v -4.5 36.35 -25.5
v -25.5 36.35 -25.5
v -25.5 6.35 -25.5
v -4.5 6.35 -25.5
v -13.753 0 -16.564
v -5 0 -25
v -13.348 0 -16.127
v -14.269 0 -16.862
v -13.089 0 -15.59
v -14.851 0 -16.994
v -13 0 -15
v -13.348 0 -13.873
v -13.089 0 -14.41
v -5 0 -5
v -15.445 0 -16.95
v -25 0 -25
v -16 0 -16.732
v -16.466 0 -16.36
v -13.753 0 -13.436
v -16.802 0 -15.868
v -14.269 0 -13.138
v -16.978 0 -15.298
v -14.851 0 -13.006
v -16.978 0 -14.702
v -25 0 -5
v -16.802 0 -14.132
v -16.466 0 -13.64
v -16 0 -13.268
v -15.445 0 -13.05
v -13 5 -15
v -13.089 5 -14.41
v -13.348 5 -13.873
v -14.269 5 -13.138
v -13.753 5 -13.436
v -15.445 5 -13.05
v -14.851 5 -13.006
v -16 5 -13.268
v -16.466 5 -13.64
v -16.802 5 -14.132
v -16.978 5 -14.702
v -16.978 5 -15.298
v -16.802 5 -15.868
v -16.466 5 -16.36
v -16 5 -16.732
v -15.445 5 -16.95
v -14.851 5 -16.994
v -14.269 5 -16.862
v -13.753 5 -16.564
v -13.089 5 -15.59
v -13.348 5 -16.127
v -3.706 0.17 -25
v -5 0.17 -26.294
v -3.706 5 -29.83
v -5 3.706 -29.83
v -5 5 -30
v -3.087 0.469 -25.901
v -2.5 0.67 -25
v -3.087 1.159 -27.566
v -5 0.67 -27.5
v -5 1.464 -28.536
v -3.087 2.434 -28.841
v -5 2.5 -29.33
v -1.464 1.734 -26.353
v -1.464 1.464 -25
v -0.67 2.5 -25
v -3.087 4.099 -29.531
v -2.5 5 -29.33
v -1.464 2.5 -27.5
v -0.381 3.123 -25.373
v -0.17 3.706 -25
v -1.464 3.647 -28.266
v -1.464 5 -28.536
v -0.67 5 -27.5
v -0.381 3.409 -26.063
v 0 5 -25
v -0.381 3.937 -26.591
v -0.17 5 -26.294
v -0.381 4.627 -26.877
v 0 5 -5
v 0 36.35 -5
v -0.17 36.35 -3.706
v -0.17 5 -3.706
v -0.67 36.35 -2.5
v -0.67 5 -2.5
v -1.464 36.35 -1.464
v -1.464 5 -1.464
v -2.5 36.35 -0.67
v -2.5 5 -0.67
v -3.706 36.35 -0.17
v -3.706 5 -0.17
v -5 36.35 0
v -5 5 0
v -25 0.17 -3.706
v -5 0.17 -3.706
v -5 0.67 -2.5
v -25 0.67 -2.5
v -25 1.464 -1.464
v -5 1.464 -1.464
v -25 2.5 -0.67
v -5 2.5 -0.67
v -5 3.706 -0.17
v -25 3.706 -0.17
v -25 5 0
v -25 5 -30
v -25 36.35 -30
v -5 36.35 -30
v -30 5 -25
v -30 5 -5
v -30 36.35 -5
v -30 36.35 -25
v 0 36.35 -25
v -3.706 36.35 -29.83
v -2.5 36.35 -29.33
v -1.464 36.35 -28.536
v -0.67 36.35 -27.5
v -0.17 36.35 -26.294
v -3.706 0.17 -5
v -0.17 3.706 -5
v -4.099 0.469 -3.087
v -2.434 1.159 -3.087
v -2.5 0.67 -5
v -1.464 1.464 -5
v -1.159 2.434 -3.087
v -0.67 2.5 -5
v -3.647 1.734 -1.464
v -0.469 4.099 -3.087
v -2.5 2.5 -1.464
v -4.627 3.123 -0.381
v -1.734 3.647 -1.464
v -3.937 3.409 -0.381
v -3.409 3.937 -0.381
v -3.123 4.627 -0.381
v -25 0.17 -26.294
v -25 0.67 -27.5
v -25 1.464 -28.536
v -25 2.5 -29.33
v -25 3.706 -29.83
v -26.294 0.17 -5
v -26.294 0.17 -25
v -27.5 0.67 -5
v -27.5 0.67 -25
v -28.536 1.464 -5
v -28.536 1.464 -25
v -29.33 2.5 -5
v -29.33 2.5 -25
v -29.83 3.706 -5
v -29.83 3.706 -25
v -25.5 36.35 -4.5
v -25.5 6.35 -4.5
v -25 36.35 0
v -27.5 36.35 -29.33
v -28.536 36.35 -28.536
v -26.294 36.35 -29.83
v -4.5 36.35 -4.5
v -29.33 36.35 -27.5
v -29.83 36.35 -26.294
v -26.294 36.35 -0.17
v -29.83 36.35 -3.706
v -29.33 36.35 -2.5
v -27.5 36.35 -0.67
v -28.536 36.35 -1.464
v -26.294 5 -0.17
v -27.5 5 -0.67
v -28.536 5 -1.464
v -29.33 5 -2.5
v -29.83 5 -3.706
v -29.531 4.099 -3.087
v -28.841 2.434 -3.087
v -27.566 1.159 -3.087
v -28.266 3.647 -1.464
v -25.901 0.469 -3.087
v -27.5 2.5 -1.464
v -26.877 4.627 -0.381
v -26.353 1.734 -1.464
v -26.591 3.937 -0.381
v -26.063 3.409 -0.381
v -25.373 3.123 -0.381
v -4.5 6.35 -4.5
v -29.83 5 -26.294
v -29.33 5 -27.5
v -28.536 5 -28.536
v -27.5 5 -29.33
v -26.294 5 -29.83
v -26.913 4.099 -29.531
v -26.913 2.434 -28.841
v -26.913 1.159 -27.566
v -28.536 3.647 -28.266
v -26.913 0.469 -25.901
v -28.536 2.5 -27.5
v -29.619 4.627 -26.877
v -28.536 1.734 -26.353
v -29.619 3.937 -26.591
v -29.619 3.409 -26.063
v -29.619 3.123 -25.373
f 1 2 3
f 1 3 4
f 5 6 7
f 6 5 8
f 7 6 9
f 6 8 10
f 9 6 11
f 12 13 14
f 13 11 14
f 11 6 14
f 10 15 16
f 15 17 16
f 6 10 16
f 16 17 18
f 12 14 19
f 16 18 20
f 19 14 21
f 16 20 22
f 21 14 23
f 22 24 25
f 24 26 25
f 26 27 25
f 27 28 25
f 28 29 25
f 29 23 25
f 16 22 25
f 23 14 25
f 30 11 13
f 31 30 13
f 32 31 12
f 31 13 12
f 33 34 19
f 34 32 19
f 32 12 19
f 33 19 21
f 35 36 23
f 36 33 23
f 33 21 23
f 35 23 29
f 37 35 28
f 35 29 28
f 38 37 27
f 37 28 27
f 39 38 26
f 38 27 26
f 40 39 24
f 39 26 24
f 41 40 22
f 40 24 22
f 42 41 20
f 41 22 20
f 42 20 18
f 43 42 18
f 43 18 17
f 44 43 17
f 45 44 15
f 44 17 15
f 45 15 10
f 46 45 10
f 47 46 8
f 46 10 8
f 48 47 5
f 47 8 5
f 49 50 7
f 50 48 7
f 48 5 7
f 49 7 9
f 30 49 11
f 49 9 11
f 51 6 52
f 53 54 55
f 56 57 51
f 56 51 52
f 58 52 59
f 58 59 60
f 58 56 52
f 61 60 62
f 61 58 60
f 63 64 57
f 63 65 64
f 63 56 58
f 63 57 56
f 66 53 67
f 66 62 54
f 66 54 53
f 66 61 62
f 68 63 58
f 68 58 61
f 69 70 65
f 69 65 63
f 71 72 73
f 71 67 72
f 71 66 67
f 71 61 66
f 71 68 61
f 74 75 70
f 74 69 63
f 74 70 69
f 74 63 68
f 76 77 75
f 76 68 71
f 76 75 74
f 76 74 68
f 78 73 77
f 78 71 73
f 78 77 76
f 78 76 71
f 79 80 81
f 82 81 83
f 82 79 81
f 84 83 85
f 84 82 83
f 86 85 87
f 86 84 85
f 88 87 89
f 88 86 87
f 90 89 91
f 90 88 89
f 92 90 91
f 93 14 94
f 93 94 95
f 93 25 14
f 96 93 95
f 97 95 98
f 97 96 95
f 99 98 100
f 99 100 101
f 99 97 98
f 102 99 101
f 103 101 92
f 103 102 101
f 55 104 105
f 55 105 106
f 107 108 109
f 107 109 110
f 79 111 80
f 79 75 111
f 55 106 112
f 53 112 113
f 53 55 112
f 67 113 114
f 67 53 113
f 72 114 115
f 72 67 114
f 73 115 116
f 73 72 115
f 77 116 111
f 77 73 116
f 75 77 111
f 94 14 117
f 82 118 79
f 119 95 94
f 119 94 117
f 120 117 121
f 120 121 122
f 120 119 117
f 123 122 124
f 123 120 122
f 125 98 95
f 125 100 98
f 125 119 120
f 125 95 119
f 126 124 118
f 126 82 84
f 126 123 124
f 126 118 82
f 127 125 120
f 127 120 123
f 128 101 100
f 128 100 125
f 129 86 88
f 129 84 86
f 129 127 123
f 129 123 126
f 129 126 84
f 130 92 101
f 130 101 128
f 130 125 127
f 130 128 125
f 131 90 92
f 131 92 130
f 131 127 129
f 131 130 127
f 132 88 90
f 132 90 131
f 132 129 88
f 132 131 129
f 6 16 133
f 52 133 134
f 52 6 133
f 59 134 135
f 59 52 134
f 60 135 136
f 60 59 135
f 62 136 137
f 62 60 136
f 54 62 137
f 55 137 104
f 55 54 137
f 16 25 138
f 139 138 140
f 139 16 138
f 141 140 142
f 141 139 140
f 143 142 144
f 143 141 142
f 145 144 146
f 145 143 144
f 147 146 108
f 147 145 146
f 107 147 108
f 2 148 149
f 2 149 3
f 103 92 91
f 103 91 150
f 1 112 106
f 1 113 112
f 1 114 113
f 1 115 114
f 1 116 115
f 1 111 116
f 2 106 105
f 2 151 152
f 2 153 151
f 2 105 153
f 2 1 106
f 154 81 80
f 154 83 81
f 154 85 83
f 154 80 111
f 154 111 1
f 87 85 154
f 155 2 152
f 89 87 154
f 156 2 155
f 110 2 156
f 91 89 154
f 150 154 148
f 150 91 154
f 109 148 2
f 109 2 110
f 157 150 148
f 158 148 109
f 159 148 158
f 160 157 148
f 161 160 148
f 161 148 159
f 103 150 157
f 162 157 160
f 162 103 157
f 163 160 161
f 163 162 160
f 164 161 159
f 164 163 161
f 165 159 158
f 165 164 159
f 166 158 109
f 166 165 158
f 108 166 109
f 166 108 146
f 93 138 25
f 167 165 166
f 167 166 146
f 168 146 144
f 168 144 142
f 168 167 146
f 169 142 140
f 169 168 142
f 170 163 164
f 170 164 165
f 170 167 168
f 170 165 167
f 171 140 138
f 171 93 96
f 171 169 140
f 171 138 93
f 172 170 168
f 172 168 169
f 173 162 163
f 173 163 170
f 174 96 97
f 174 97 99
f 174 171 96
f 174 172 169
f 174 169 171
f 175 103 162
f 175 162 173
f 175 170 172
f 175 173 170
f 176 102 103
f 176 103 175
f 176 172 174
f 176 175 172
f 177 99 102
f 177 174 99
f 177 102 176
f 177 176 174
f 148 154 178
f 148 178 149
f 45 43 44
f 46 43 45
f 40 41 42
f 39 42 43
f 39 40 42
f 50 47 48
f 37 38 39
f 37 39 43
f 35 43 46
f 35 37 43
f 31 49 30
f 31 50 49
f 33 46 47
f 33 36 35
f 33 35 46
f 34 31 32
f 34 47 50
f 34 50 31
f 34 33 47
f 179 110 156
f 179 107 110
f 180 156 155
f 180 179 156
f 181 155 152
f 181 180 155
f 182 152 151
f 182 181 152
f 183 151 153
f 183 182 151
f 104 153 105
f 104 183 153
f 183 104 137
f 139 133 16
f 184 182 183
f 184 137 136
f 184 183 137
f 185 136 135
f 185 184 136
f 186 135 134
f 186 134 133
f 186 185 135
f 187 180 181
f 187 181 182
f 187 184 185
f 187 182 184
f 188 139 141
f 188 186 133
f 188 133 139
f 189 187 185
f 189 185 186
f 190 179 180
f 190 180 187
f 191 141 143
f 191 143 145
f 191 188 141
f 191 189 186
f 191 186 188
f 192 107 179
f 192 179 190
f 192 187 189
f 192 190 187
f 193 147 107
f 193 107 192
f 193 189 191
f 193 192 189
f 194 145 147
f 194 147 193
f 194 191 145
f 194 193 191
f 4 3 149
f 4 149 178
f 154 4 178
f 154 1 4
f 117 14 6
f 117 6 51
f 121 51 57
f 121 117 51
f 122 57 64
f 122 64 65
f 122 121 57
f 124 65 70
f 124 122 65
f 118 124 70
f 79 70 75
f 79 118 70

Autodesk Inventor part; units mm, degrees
ref_plane "YZ Plane" through (0, 0, 0) normal (1, 0, 0) x (0, 1, 0)
ref_plane "XZ Plane" through (0, 0, 0) normal (0, 1, 0) x (-1, 0, 0)
ref_plane "XY Plane" through (0, 0, 0) normal (0, 0, 1) x (1, 0, 0)
sketch "Sketch1" plane through (0, 0, 0) normal (0, 1, 0) x (-1, 0, 0)
  line L0 (0, 0) -> (30, 0)
  line L1 (30, 0) -> (30, -30)
  line L2 (30, -30) -> (0, -30)
  line L3 (0, -30) -> (0, 0)
  dimension "d0" = 30
  dimension "d1" = 30
extrude "Extrusion1" add sketch "Sketch1" along normal blind 36.35
sketch "Sketch2" plane through (0, 36.35, 0) normal (0, 1, 0) x (1, 0, 0)
  line L0 (0, 0) -> (0, 30) projected
  line L1 (0, 0) -> (0, 4.5)
  line L2 (0, 4.5) -> (-4.5, 4.5)
  line L3 (-4.5, 4.5) -> (-25.5, 4.5)
  line L4 (-25.5, 4.5) -> (-25.5, 25.5)
  line L5 (-25.5, 25.5) -> (-4.5, 25.5)
  line L6 (-4.5, 25.5) -> (-4.5, 4.5)
  dimension "d4" = 4.5
  dimension "d5" = 4.5
  dimension "d6" = 21
  dimension "d7" = 21
extrude "Extrusion2" cut sketch "Sketch2" against normal blind 30
sketch "Sketch3" plane through (0, 0, 0) normal (0, -1, 0) x (1, 0, 0)
  line L0 (0, 0) -> (-15, 0)
  line L1 (0, 0) -> (-30, 0) projected
  line L2 (-15, 0) -> (-15, -15)
  circle A0 centre (-15, -15) radius 2
  dimension "d10" = 15
  dimension "d11" = 4
extrude "Extrusion3" cut sketch "Sketch3" against normal blind 5
fillet "Fillet1" radius 5 4 edges at (0, 0, -15) (-15, 0, 0) (-15, 0, -30) (-30, 0, -15)
fillet "Fillet2" radius 5 8 edges at (-1.4645, 1.4645, -28.5355) (0, 20.675, -30) (-1.4645, 1.4645, -1.4645) (0, 20.675, 0) (-28.5355, 1.4645, -28.5355) (-30, 20.675, -30) (-28.5355, 1.4645, -1.4645) (-30, 20.675, 0)
properties part number "_25in_2020_Endcap"
